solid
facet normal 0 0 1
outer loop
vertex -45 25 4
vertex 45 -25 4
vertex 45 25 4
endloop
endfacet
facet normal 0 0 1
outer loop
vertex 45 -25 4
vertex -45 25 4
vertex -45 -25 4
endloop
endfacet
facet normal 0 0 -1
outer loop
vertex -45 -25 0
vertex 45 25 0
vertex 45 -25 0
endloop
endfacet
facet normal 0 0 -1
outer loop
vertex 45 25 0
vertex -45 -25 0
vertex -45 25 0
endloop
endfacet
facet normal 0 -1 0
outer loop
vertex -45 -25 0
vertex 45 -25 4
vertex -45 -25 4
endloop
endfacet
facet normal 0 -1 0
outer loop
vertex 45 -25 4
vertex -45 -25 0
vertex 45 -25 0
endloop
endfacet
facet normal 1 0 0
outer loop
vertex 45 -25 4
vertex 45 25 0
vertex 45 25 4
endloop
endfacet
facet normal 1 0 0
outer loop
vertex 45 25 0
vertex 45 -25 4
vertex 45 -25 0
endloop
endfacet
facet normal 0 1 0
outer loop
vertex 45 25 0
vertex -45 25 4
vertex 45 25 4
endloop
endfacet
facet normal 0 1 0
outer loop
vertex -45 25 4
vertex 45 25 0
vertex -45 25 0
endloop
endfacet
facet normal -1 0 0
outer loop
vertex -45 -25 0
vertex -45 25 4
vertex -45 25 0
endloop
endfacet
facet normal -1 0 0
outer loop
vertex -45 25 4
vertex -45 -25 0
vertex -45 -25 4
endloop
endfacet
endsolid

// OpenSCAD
// Generated with SolidPython2 for OpenSCAD task-007
$fn = 64;

difference() {
	translate(v = [-45.0, -25.0, 0]) {
		cube(size = [90, 50, 4]);
	}
}
